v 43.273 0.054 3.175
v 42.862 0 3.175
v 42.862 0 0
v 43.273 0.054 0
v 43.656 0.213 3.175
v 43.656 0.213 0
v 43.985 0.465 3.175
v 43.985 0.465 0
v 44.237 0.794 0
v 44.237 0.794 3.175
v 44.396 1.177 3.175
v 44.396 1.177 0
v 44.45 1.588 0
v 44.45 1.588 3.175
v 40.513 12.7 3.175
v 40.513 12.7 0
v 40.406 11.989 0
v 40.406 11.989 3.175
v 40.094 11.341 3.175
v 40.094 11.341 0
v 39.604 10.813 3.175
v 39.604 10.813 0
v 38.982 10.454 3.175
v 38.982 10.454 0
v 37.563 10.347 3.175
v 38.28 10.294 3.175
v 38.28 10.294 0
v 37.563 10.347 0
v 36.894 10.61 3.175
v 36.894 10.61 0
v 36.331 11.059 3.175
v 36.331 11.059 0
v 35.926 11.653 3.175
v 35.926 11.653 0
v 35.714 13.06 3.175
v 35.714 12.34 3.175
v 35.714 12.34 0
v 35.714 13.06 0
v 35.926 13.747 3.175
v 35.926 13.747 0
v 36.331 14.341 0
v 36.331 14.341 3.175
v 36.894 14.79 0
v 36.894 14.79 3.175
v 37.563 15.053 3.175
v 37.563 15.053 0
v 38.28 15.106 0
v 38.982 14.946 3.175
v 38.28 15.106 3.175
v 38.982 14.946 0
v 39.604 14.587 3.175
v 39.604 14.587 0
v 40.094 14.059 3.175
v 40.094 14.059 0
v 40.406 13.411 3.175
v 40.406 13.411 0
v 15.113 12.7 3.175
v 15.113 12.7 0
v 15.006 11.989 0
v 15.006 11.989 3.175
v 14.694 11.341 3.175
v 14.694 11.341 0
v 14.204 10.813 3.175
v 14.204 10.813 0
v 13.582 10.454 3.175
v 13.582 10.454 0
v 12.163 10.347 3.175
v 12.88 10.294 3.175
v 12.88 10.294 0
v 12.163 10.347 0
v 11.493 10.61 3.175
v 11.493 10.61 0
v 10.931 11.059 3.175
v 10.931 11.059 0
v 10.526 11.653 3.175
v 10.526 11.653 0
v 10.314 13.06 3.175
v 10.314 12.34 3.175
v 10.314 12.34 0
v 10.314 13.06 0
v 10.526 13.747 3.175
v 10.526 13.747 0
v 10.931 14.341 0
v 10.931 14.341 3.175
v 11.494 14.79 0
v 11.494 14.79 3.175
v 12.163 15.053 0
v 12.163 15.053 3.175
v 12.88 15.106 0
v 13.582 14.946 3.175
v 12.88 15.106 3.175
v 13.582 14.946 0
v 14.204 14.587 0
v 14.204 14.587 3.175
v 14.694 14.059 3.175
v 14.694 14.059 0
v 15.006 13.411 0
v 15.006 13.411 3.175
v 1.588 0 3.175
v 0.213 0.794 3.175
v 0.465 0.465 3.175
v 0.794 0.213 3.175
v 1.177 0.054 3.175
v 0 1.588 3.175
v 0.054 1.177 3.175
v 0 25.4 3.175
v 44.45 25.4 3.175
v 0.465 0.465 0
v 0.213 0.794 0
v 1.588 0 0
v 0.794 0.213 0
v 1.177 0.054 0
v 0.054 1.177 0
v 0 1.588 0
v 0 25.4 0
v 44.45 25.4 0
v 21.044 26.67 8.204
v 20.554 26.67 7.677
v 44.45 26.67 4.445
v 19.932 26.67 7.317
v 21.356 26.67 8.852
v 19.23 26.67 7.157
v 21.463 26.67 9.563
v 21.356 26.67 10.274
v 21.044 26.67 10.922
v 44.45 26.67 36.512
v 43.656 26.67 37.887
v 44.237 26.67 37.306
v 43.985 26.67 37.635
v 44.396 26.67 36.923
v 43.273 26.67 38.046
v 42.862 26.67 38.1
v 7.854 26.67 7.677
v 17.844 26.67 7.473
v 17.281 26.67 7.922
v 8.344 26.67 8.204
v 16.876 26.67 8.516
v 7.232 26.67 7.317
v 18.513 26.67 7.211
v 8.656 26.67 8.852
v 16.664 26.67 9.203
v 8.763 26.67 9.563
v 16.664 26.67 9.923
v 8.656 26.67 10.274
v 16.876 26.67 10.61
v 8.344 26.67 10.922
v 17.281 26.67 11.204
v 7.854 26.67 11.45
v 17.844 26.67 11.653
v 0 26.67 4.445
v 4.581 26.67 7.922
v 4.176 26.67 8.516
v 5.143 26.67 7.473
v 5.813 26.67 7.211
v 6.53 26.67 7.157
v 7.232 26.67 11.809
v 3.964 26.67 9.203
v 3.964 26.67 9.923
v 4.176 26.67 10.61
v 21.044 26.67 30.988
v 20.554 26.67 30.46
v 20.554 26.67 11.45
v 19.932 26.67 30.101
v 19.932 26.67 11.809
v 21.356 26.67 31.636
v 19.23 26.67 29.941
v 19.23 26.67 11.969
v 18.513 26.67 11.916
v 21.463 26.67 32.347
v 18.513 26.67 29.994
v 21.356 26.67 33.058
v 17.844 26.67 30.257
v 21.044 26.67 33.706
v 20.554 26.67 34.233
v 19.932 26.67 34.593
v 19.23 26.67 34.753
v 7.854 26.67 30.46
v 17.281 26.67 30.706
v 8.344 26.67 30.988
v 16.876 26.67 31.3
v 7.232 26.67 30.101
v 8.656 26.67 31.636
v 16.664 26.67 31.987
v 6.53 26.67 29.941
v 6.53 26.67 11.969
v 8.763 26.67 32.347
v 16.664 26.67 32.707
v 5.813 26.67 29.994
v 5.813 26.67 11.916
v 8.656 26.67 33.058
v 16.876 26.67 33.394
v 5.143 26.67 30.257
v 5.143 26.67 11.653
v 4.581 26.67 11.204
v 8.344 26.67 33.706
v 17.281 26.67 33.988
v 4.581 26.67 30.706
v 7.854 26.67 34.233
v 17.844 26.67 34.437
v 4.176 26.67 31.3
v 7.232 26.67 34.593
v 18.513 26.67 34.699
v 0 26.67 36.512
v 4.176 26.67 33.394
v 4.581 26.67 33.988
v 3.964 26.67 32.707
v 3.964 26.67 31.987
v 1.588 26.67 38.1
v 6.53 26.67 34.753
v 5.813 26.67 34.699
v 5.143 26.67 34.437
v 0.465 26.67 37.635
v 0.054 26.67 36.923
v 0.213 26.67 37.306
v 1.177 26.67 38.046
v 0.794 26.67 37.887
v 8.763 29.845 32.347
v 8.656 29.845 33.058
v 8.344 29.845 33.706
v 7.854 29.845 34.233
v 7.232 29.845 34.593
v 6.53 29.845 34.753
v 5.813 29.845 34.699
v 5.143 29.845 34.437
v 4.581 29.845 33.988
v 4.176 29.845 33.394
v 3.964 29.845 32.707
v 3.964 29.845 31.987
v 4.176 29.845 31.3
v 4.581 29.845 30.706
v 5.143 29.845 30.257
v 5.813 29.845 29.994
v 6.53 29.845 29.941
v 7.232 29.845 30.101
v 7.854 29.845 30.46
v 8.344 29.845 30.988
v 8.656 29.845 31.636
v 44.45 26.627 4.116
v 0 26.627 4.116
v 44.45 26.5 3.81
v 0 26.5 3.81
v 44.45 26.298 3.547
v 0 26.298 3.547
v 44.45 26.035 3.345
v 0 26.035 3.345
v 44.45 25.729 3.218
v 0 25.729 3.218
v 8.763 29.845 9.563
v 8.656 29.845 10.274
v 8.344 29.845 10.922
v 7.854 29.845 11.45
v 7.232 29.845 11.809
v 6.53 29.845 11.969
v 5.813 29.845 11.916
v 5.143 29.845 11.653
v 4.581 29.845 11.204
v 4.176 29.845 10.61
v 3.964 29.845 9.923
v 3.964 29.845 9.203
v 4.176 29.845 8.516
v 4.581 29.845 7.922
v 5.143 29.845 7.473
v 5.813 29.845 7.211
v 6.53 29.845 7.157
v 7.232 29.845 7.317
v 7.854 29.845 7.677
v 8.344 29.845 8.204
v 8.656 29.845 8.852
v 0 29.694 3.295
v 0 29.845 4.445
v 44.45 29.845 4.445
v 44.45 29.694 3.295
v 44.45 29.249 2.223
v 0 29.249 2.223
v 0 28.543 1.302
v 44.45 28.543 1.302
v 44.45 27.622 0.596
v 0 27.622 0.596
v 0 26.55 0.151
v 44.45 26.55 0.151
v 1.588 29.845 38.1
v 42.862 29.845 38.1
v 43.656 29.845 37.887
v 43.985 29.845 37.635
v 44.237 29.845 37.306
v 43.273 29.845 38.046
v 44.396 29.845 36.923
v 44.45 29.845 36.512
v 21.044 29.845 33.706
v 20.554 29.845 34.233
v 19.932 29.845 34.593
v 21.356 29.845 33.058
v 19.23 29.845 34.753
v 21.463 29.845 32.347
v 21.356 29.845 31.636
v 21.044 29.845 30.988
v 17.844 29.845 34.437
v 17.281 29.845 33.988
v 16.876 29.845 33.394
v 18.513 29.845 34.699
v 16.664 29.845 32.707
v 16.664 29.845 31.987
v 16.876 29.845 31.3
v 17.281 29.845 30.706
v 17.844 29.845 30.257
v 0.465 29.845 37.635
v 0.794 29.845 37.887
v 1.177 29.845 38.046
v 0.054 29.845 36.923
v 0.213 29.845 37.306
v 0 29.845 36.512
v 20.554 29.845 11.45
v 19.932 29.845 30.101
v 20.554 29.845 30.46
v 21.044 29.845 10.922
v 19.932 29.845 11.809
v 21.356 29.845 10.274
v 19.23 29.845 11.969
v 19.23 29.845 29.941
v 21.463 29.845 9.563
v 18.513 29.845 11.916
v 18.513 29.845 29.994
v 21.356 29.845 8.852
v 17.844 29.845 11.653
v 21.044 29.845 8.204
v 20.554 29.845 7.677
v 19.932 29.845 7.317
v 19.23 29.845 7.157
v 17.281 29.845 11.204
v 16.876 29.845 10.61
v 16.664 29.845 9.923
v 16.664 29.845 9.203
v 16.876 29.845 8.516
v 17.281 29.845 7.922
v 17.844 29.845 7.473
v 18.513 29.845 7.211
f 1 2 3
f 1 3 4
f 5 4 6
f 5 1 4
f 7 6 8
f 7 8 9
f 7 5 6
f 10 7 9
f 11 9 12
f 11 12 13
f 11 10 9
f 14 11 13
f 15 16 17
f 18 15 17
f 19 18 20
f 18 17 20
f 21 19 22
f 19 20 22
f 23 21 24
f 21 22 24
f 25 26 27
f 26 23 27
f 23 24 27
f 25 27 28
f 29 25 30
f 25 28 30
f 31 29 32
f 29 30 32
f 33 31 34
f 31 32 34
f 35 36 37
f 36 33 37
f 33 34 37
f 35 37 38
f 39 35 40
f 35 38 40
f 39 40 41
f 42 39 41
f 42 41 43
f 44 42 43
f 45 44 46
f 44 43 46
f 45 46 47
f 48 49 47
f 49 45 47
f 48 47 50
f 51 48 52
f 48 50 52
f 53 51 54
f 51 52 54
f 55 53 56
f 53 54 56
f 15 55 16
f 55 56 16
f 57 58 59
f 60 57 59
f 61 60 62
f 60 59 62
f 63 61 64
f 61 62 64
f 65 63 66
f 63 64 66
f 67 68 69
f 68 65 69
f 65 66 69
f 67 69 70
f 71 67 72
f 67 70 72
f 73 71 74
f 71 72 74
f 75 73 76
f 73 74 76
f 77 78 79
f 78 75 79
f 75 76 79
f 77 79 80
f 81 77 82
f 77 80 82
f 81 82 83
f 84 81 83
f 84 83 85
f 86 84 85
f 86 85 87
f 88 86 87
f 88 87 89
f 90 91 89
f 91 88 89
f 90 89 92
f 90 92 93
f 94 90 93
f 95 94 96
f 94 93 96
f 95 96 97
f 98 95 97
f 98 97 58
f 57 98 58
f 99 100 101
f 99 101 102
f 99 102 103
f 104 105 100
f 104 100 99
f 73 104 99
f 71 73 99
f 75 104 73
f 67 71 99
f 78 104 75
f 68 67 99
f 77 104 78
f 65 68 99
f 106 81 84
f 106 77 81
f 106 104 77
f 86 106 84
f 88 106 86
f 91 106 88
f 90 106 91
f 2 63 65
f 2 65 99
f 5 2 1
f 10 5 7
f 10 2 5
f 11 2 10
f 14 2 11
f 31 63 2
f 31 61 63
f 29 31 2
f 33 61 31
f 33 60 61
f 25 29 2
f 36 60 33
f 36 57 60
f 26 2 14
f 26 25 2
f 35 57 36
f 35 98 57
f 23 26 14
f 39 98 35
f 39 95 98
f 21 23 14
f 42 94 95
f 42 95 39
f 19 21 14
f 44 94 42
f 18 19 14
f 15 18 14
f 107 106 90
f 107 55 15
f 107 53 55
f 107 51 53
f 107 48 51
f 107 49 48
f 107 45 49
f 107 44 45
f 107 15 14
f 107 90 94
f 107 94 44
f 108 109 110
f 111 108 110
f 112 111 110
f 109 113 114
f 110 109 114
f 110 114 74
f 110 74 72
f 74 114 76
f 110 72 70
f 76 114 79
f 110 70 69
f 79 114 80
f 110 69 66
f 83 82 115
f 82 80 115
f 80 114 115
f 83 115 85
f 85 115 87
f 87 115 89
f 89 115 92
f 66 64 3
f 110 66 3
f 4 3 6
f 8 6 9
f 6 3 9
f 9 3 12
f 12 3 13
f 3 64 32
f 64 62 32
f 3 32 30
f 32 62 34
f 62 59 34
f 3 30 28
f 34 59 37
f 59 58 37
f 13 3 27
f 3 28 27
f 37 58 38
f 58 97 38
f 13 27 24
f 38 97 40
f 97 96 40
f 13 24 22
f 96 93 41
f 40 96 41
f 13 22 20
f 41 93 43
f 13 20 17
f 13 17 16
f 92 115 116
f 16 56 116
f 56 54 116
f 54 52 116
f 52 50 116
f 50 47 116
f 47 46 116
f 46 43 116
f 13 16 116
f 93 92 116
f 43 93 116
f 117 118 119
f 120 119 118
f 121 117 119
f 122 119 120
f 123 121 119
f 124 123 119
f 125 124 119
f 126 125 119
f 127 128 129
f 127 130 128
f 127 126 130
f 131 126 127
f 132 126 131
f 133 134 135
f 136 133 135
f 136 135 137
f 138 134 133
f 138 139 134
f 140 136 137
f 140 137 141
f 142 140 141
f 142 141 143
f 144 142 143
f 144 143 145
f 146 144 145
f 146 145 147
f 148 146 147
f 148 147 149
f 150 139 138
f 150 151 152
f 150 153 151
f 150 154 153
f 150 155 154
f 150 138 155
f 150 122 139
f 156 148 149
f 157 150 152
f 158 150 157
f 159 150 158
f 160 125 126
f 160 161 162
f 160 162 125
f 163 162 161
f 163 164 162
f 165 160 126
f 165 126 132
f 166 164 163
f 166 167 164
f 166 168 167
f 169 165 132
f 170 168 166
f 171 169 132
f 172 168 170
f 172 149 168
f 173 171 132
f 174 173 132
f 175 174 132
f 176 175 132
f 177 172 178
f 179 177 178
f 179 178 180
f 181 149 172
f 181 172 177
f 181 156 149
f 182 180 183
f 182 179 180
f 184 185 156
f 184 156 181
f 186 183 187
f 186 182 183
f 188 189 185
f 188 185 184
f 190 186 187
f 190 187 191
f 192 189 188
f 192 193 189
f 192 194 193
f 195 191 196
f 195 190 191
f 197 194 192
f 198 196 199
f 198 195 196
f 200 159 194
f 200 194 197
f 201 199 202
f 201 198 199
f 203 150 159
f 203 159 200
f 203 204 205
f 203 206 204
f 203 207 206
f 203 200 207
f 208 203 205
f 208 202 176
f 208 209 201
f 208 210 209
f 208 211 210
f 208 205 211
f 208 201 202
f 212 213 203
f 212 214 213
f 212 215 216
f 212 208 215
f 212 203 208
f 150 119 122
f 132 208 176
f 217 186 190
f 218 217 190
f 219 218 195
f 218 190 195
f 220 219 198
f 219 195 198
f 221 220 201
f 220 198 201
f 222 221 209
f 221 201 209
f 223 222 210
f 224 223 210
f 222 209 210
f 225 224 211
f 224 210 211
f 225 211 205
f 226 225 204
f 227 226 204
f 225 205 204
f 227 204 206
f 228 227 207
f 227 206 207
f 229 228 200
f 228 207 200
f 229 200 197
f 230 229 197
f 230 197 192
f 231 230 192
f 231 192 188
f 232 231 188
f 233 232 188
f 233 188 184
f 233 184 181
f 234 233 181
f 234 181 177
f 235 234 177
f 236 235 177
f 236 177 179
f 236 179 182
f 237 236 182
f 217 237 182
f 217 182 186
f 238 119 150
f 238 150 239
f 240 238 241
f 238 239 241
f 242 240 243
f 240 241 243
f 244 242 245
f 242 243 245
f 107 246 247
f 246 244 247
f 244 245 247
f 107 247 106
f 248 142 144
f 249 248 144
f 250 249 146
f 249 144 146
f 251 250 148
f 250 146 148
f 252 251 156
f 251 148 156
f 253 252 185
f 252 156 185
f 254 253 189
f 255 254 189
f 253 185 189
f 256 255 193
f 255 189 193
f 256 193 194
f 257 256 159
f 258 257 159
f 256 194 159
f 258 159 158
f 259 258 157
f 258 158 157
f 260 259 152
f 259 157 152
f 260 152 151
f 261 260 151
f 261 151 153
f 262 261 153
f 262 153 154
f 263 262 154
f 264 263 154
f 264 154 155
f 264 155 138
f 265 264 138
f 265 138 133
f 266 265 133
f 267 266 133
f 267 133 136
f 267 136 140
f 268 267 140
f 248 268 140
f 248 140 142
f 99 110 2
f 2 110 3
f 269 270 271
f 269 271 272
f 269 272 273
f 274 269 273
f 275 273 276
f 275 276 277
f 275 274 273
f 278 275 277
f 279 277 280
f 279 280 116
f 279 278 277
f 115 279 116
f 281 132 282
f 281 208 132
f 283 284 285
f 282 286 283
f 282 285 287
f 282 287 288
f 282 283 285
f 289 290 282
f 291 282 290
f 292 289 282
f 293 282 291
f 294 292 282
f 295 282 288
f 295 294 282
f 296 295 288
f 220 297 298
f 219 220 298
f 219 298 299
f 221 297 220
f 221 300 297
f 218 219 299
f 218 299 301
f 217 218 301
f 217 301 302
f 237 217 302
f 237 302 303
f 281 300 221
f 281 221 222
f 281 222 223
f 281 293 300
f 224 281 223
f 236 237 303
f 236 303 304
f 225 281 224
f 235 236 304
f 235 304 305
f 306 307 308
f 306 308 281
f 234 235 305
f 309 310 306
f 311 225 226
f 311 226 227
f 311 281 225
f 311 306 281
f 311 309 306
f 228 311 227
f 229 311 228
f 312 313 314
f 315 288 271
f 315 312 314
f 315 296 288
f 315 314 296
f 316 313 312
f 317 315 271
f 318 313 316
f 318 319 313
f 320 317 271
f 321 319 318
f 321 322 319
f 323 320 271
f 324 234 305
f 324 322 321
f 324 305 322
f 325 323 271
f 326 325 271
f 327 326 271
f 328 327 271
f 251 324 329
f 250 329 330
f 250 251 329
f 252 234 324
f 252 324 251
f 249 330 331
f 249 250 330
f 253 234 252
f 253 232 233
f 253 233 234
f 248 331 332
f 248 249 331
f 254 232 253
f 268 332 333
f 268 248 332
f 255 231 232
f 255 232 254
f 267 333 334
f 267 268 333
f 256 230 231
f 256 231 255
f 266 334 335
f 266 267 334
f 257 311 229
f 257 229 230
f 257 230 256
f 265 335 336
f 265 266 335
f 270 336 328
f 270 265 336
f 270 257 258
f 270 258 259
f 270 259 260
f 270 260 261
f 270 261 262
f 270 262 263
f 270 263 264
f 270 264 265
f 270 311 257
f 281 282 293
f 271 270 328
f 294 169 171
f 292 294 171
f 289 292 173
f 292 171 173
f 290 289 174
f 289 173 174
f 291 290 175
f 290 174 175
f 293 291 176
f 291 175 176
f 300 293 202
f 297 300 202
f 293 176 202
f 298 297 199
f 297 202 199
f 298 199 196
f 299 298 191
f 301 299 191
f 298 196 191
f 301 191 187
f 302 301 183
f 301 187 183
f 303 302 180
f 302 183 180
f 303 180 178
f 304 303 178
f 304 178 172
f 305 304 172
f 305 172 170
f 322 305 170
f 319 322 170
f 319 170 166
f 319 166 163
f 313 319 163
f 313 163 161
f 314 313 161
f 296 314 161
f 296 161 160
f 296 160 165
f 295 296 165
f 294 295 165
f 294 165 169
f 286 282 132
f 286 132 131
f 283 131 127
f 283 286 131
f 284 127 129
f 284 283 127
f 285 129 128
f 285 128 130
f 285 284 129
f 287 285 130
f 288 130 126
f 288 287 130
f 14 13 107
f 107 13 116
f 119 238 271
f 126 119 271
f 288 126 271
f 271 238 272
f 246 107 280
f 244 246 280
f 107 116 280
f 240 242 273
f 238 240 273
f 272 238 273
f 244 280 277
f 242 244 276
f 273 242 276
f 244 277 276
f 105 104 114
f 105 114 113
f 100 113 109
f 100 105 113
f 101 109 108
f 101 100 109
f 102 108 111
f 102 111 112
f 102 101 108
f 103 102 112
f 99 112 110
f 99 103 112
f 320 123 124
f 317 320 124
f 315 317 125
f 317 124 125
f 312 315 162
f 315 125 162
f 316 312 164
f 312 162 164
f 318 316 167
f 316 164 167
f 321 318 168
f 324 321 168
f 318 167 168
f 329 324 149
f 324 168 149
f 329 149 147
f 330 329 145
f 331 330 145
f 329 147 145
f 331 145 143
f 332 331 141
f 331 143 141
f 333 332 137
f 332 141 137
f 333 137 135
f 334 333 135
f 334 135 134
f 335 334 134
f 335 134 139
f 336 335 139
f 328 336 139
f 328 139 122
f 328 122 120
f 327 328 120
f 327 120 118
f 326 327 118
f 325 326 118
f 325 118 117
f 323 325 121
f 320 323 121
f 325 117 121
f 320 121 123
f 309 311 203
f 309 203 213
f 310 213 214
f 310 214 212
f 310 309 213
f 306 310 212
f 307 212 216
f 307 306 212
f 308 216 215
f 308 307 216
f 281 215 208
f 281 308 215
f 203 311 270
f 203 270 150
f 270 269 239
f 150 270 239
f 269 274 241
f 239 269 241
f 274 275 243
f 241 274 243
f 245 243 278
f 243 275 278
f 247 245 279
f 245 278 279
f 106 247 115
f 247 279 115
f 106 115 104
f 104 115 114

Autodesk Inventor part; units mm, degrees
ref_plane "YZ Plane" through (0, 0, 0) normal (1, 0, 0) x (0, 1, 0)
ref_plane "XZ Plane" through (0, 0, 0) normal (0, 1, 0) x (-1, 0, 0)
ref_plane "XY Plane" through (0, 0, 0) normal (0, 0, 1) x (1, 0, 0)
sketch "Sketch1" plane through (0, 0, 0) normal (0, 0, 1) x (1, 0, 0)
  line L0 (0, 0) -> (44.45, 0)
  line L1 (44.45, 0) -> (44.45, 25.4)
  line L2 (44.45, 25.4) -> (0, 25.4)
  line L3 (0, 25.4) -> (0, 0)
  circle A0 centre (12.7, 12.7) radius 2.413
  line L4 (0, 12.7) -> (44.45, 12.7) construction
  circle A1 centre (38.1, 12.7) radius 2.413
  dimension "d0" = 44.45
  dimension "d1" = 25.4
  dimension "d2" = 4.826
  dimension "d6" = 25.4
  dimension "d32" = 6.35
extrude "Plate1" add sketch "Sketch1" along normal blind 3.175
sketch "Sketch2" plane through (0, 26.67, 4.445) normal (0, 1, 0) x (-1, 0, 0)
  line L0 (-44.45, 0) -> (0, 0)
  line L1 (0, 0) -> (0, 33.655)
  line L2 (0, 33.655) -> (-44.45, 33.655)
  line L3 (-44.45, 33.655) -> (-44.45, 0)
edge flange "Flange1" height 38.1 angle 90 thickness 3.175 bend radius 1.27 thickness toward (0, 1, 0) relief tear relief width 3.175 relief depth 1.5875 edges at (22.225, 25.4, 3.175) wall of the first edge with corners at (44.45, 26.67, 4.445) (0, 26.67, 4.445) (0, 26.67, 38.1) (44.45, 26.67, 38.1)
bend "Bend1"
corner "Corner1"
fillet "Fillet1" radius 1.5875 4 edges at (44.45, 0, 1.5875) (0, 0, 1.5875) (44.45, 28.2575, 38.1) (0, 28.2575, 38.1)
sketch "Sketch3" plane through (0, 26.67, 4.445) normal (0, -1, 0) x (1, 0, 0)
  line L0 (3.175, 33.655) -> (22.225, 33.655) construction
  line L1 (22.225, 33.655) -> (22.225, -0.635) construction
  line L2 (22.225, -0.635) -> (3.175, -0.635) construction
  line L3 (3.175, -0.635) -> (3.175, 33.655) construction
  circle A0 centre (19.05, 27.9019) radius 2.413
  line L4 (12.7, 33.655) -> (12.7, -0.635) construction
  line L5 (3.175, 16.51) -> (22.225, 16.51) construction
  circle A1 centre (6.35, 27.9019) radius 2.413
  circle A2 centre (19.05, 5.1181) radius 2.413
  circle A3 centre (6.35, 5.1181) radius 2.413
  line L6 (44.45, 32.0675) -> (44.45, 0) projected
  line L7 (42.8625, 33.655) -> (1.5875, 33.655) projected
  point P0 (0, -4.445)
  dimension "d23" = 34.29
  dimension "d24" = 19.05
  dimension "d27" = 4.826
  dimension "d28" = 3.175
  dimension "d29" = 5.7531
  dimension "d33" = 22.225
extrude "Extrusion1" cut sketch "Sketch3" against normal blind 25.4
equation "\"d12\" = BendReliefWidth"
equation "\"d13\" = BendReliefDepth"
equation "\"d14\" = MinimumRemnant"
equation "\"d15\" = BendRadius"
equation "\"d19\" = CornerReliefSize"
equation "\"d20\" = GapSize"
equation "\"d21\" = JacobiRadiusSize"
equation "\"BendRadius\" = Thickness"
equation "\"BendReliefWidth\" = Thickness"
equation "\"BendReliefDepth\" = 0.5 * Thickness"
equation "\"CornerReliefSize\" = 4 * Thickness"
equation "\"MinimumRemnant\" = 2 * Thickness"
equation "\"TransitionRadius\" = BendRadius"
equation "\"JacobiRadiusSize\" = BendRadius"
equation "\"GapSize\" = Thickness"
equation "\"d11\" = BendRadius"
equation "\"Thickness\" = 3.175"
properties part number "Pneumatic Piston Back Flange (Rt Custom)"
